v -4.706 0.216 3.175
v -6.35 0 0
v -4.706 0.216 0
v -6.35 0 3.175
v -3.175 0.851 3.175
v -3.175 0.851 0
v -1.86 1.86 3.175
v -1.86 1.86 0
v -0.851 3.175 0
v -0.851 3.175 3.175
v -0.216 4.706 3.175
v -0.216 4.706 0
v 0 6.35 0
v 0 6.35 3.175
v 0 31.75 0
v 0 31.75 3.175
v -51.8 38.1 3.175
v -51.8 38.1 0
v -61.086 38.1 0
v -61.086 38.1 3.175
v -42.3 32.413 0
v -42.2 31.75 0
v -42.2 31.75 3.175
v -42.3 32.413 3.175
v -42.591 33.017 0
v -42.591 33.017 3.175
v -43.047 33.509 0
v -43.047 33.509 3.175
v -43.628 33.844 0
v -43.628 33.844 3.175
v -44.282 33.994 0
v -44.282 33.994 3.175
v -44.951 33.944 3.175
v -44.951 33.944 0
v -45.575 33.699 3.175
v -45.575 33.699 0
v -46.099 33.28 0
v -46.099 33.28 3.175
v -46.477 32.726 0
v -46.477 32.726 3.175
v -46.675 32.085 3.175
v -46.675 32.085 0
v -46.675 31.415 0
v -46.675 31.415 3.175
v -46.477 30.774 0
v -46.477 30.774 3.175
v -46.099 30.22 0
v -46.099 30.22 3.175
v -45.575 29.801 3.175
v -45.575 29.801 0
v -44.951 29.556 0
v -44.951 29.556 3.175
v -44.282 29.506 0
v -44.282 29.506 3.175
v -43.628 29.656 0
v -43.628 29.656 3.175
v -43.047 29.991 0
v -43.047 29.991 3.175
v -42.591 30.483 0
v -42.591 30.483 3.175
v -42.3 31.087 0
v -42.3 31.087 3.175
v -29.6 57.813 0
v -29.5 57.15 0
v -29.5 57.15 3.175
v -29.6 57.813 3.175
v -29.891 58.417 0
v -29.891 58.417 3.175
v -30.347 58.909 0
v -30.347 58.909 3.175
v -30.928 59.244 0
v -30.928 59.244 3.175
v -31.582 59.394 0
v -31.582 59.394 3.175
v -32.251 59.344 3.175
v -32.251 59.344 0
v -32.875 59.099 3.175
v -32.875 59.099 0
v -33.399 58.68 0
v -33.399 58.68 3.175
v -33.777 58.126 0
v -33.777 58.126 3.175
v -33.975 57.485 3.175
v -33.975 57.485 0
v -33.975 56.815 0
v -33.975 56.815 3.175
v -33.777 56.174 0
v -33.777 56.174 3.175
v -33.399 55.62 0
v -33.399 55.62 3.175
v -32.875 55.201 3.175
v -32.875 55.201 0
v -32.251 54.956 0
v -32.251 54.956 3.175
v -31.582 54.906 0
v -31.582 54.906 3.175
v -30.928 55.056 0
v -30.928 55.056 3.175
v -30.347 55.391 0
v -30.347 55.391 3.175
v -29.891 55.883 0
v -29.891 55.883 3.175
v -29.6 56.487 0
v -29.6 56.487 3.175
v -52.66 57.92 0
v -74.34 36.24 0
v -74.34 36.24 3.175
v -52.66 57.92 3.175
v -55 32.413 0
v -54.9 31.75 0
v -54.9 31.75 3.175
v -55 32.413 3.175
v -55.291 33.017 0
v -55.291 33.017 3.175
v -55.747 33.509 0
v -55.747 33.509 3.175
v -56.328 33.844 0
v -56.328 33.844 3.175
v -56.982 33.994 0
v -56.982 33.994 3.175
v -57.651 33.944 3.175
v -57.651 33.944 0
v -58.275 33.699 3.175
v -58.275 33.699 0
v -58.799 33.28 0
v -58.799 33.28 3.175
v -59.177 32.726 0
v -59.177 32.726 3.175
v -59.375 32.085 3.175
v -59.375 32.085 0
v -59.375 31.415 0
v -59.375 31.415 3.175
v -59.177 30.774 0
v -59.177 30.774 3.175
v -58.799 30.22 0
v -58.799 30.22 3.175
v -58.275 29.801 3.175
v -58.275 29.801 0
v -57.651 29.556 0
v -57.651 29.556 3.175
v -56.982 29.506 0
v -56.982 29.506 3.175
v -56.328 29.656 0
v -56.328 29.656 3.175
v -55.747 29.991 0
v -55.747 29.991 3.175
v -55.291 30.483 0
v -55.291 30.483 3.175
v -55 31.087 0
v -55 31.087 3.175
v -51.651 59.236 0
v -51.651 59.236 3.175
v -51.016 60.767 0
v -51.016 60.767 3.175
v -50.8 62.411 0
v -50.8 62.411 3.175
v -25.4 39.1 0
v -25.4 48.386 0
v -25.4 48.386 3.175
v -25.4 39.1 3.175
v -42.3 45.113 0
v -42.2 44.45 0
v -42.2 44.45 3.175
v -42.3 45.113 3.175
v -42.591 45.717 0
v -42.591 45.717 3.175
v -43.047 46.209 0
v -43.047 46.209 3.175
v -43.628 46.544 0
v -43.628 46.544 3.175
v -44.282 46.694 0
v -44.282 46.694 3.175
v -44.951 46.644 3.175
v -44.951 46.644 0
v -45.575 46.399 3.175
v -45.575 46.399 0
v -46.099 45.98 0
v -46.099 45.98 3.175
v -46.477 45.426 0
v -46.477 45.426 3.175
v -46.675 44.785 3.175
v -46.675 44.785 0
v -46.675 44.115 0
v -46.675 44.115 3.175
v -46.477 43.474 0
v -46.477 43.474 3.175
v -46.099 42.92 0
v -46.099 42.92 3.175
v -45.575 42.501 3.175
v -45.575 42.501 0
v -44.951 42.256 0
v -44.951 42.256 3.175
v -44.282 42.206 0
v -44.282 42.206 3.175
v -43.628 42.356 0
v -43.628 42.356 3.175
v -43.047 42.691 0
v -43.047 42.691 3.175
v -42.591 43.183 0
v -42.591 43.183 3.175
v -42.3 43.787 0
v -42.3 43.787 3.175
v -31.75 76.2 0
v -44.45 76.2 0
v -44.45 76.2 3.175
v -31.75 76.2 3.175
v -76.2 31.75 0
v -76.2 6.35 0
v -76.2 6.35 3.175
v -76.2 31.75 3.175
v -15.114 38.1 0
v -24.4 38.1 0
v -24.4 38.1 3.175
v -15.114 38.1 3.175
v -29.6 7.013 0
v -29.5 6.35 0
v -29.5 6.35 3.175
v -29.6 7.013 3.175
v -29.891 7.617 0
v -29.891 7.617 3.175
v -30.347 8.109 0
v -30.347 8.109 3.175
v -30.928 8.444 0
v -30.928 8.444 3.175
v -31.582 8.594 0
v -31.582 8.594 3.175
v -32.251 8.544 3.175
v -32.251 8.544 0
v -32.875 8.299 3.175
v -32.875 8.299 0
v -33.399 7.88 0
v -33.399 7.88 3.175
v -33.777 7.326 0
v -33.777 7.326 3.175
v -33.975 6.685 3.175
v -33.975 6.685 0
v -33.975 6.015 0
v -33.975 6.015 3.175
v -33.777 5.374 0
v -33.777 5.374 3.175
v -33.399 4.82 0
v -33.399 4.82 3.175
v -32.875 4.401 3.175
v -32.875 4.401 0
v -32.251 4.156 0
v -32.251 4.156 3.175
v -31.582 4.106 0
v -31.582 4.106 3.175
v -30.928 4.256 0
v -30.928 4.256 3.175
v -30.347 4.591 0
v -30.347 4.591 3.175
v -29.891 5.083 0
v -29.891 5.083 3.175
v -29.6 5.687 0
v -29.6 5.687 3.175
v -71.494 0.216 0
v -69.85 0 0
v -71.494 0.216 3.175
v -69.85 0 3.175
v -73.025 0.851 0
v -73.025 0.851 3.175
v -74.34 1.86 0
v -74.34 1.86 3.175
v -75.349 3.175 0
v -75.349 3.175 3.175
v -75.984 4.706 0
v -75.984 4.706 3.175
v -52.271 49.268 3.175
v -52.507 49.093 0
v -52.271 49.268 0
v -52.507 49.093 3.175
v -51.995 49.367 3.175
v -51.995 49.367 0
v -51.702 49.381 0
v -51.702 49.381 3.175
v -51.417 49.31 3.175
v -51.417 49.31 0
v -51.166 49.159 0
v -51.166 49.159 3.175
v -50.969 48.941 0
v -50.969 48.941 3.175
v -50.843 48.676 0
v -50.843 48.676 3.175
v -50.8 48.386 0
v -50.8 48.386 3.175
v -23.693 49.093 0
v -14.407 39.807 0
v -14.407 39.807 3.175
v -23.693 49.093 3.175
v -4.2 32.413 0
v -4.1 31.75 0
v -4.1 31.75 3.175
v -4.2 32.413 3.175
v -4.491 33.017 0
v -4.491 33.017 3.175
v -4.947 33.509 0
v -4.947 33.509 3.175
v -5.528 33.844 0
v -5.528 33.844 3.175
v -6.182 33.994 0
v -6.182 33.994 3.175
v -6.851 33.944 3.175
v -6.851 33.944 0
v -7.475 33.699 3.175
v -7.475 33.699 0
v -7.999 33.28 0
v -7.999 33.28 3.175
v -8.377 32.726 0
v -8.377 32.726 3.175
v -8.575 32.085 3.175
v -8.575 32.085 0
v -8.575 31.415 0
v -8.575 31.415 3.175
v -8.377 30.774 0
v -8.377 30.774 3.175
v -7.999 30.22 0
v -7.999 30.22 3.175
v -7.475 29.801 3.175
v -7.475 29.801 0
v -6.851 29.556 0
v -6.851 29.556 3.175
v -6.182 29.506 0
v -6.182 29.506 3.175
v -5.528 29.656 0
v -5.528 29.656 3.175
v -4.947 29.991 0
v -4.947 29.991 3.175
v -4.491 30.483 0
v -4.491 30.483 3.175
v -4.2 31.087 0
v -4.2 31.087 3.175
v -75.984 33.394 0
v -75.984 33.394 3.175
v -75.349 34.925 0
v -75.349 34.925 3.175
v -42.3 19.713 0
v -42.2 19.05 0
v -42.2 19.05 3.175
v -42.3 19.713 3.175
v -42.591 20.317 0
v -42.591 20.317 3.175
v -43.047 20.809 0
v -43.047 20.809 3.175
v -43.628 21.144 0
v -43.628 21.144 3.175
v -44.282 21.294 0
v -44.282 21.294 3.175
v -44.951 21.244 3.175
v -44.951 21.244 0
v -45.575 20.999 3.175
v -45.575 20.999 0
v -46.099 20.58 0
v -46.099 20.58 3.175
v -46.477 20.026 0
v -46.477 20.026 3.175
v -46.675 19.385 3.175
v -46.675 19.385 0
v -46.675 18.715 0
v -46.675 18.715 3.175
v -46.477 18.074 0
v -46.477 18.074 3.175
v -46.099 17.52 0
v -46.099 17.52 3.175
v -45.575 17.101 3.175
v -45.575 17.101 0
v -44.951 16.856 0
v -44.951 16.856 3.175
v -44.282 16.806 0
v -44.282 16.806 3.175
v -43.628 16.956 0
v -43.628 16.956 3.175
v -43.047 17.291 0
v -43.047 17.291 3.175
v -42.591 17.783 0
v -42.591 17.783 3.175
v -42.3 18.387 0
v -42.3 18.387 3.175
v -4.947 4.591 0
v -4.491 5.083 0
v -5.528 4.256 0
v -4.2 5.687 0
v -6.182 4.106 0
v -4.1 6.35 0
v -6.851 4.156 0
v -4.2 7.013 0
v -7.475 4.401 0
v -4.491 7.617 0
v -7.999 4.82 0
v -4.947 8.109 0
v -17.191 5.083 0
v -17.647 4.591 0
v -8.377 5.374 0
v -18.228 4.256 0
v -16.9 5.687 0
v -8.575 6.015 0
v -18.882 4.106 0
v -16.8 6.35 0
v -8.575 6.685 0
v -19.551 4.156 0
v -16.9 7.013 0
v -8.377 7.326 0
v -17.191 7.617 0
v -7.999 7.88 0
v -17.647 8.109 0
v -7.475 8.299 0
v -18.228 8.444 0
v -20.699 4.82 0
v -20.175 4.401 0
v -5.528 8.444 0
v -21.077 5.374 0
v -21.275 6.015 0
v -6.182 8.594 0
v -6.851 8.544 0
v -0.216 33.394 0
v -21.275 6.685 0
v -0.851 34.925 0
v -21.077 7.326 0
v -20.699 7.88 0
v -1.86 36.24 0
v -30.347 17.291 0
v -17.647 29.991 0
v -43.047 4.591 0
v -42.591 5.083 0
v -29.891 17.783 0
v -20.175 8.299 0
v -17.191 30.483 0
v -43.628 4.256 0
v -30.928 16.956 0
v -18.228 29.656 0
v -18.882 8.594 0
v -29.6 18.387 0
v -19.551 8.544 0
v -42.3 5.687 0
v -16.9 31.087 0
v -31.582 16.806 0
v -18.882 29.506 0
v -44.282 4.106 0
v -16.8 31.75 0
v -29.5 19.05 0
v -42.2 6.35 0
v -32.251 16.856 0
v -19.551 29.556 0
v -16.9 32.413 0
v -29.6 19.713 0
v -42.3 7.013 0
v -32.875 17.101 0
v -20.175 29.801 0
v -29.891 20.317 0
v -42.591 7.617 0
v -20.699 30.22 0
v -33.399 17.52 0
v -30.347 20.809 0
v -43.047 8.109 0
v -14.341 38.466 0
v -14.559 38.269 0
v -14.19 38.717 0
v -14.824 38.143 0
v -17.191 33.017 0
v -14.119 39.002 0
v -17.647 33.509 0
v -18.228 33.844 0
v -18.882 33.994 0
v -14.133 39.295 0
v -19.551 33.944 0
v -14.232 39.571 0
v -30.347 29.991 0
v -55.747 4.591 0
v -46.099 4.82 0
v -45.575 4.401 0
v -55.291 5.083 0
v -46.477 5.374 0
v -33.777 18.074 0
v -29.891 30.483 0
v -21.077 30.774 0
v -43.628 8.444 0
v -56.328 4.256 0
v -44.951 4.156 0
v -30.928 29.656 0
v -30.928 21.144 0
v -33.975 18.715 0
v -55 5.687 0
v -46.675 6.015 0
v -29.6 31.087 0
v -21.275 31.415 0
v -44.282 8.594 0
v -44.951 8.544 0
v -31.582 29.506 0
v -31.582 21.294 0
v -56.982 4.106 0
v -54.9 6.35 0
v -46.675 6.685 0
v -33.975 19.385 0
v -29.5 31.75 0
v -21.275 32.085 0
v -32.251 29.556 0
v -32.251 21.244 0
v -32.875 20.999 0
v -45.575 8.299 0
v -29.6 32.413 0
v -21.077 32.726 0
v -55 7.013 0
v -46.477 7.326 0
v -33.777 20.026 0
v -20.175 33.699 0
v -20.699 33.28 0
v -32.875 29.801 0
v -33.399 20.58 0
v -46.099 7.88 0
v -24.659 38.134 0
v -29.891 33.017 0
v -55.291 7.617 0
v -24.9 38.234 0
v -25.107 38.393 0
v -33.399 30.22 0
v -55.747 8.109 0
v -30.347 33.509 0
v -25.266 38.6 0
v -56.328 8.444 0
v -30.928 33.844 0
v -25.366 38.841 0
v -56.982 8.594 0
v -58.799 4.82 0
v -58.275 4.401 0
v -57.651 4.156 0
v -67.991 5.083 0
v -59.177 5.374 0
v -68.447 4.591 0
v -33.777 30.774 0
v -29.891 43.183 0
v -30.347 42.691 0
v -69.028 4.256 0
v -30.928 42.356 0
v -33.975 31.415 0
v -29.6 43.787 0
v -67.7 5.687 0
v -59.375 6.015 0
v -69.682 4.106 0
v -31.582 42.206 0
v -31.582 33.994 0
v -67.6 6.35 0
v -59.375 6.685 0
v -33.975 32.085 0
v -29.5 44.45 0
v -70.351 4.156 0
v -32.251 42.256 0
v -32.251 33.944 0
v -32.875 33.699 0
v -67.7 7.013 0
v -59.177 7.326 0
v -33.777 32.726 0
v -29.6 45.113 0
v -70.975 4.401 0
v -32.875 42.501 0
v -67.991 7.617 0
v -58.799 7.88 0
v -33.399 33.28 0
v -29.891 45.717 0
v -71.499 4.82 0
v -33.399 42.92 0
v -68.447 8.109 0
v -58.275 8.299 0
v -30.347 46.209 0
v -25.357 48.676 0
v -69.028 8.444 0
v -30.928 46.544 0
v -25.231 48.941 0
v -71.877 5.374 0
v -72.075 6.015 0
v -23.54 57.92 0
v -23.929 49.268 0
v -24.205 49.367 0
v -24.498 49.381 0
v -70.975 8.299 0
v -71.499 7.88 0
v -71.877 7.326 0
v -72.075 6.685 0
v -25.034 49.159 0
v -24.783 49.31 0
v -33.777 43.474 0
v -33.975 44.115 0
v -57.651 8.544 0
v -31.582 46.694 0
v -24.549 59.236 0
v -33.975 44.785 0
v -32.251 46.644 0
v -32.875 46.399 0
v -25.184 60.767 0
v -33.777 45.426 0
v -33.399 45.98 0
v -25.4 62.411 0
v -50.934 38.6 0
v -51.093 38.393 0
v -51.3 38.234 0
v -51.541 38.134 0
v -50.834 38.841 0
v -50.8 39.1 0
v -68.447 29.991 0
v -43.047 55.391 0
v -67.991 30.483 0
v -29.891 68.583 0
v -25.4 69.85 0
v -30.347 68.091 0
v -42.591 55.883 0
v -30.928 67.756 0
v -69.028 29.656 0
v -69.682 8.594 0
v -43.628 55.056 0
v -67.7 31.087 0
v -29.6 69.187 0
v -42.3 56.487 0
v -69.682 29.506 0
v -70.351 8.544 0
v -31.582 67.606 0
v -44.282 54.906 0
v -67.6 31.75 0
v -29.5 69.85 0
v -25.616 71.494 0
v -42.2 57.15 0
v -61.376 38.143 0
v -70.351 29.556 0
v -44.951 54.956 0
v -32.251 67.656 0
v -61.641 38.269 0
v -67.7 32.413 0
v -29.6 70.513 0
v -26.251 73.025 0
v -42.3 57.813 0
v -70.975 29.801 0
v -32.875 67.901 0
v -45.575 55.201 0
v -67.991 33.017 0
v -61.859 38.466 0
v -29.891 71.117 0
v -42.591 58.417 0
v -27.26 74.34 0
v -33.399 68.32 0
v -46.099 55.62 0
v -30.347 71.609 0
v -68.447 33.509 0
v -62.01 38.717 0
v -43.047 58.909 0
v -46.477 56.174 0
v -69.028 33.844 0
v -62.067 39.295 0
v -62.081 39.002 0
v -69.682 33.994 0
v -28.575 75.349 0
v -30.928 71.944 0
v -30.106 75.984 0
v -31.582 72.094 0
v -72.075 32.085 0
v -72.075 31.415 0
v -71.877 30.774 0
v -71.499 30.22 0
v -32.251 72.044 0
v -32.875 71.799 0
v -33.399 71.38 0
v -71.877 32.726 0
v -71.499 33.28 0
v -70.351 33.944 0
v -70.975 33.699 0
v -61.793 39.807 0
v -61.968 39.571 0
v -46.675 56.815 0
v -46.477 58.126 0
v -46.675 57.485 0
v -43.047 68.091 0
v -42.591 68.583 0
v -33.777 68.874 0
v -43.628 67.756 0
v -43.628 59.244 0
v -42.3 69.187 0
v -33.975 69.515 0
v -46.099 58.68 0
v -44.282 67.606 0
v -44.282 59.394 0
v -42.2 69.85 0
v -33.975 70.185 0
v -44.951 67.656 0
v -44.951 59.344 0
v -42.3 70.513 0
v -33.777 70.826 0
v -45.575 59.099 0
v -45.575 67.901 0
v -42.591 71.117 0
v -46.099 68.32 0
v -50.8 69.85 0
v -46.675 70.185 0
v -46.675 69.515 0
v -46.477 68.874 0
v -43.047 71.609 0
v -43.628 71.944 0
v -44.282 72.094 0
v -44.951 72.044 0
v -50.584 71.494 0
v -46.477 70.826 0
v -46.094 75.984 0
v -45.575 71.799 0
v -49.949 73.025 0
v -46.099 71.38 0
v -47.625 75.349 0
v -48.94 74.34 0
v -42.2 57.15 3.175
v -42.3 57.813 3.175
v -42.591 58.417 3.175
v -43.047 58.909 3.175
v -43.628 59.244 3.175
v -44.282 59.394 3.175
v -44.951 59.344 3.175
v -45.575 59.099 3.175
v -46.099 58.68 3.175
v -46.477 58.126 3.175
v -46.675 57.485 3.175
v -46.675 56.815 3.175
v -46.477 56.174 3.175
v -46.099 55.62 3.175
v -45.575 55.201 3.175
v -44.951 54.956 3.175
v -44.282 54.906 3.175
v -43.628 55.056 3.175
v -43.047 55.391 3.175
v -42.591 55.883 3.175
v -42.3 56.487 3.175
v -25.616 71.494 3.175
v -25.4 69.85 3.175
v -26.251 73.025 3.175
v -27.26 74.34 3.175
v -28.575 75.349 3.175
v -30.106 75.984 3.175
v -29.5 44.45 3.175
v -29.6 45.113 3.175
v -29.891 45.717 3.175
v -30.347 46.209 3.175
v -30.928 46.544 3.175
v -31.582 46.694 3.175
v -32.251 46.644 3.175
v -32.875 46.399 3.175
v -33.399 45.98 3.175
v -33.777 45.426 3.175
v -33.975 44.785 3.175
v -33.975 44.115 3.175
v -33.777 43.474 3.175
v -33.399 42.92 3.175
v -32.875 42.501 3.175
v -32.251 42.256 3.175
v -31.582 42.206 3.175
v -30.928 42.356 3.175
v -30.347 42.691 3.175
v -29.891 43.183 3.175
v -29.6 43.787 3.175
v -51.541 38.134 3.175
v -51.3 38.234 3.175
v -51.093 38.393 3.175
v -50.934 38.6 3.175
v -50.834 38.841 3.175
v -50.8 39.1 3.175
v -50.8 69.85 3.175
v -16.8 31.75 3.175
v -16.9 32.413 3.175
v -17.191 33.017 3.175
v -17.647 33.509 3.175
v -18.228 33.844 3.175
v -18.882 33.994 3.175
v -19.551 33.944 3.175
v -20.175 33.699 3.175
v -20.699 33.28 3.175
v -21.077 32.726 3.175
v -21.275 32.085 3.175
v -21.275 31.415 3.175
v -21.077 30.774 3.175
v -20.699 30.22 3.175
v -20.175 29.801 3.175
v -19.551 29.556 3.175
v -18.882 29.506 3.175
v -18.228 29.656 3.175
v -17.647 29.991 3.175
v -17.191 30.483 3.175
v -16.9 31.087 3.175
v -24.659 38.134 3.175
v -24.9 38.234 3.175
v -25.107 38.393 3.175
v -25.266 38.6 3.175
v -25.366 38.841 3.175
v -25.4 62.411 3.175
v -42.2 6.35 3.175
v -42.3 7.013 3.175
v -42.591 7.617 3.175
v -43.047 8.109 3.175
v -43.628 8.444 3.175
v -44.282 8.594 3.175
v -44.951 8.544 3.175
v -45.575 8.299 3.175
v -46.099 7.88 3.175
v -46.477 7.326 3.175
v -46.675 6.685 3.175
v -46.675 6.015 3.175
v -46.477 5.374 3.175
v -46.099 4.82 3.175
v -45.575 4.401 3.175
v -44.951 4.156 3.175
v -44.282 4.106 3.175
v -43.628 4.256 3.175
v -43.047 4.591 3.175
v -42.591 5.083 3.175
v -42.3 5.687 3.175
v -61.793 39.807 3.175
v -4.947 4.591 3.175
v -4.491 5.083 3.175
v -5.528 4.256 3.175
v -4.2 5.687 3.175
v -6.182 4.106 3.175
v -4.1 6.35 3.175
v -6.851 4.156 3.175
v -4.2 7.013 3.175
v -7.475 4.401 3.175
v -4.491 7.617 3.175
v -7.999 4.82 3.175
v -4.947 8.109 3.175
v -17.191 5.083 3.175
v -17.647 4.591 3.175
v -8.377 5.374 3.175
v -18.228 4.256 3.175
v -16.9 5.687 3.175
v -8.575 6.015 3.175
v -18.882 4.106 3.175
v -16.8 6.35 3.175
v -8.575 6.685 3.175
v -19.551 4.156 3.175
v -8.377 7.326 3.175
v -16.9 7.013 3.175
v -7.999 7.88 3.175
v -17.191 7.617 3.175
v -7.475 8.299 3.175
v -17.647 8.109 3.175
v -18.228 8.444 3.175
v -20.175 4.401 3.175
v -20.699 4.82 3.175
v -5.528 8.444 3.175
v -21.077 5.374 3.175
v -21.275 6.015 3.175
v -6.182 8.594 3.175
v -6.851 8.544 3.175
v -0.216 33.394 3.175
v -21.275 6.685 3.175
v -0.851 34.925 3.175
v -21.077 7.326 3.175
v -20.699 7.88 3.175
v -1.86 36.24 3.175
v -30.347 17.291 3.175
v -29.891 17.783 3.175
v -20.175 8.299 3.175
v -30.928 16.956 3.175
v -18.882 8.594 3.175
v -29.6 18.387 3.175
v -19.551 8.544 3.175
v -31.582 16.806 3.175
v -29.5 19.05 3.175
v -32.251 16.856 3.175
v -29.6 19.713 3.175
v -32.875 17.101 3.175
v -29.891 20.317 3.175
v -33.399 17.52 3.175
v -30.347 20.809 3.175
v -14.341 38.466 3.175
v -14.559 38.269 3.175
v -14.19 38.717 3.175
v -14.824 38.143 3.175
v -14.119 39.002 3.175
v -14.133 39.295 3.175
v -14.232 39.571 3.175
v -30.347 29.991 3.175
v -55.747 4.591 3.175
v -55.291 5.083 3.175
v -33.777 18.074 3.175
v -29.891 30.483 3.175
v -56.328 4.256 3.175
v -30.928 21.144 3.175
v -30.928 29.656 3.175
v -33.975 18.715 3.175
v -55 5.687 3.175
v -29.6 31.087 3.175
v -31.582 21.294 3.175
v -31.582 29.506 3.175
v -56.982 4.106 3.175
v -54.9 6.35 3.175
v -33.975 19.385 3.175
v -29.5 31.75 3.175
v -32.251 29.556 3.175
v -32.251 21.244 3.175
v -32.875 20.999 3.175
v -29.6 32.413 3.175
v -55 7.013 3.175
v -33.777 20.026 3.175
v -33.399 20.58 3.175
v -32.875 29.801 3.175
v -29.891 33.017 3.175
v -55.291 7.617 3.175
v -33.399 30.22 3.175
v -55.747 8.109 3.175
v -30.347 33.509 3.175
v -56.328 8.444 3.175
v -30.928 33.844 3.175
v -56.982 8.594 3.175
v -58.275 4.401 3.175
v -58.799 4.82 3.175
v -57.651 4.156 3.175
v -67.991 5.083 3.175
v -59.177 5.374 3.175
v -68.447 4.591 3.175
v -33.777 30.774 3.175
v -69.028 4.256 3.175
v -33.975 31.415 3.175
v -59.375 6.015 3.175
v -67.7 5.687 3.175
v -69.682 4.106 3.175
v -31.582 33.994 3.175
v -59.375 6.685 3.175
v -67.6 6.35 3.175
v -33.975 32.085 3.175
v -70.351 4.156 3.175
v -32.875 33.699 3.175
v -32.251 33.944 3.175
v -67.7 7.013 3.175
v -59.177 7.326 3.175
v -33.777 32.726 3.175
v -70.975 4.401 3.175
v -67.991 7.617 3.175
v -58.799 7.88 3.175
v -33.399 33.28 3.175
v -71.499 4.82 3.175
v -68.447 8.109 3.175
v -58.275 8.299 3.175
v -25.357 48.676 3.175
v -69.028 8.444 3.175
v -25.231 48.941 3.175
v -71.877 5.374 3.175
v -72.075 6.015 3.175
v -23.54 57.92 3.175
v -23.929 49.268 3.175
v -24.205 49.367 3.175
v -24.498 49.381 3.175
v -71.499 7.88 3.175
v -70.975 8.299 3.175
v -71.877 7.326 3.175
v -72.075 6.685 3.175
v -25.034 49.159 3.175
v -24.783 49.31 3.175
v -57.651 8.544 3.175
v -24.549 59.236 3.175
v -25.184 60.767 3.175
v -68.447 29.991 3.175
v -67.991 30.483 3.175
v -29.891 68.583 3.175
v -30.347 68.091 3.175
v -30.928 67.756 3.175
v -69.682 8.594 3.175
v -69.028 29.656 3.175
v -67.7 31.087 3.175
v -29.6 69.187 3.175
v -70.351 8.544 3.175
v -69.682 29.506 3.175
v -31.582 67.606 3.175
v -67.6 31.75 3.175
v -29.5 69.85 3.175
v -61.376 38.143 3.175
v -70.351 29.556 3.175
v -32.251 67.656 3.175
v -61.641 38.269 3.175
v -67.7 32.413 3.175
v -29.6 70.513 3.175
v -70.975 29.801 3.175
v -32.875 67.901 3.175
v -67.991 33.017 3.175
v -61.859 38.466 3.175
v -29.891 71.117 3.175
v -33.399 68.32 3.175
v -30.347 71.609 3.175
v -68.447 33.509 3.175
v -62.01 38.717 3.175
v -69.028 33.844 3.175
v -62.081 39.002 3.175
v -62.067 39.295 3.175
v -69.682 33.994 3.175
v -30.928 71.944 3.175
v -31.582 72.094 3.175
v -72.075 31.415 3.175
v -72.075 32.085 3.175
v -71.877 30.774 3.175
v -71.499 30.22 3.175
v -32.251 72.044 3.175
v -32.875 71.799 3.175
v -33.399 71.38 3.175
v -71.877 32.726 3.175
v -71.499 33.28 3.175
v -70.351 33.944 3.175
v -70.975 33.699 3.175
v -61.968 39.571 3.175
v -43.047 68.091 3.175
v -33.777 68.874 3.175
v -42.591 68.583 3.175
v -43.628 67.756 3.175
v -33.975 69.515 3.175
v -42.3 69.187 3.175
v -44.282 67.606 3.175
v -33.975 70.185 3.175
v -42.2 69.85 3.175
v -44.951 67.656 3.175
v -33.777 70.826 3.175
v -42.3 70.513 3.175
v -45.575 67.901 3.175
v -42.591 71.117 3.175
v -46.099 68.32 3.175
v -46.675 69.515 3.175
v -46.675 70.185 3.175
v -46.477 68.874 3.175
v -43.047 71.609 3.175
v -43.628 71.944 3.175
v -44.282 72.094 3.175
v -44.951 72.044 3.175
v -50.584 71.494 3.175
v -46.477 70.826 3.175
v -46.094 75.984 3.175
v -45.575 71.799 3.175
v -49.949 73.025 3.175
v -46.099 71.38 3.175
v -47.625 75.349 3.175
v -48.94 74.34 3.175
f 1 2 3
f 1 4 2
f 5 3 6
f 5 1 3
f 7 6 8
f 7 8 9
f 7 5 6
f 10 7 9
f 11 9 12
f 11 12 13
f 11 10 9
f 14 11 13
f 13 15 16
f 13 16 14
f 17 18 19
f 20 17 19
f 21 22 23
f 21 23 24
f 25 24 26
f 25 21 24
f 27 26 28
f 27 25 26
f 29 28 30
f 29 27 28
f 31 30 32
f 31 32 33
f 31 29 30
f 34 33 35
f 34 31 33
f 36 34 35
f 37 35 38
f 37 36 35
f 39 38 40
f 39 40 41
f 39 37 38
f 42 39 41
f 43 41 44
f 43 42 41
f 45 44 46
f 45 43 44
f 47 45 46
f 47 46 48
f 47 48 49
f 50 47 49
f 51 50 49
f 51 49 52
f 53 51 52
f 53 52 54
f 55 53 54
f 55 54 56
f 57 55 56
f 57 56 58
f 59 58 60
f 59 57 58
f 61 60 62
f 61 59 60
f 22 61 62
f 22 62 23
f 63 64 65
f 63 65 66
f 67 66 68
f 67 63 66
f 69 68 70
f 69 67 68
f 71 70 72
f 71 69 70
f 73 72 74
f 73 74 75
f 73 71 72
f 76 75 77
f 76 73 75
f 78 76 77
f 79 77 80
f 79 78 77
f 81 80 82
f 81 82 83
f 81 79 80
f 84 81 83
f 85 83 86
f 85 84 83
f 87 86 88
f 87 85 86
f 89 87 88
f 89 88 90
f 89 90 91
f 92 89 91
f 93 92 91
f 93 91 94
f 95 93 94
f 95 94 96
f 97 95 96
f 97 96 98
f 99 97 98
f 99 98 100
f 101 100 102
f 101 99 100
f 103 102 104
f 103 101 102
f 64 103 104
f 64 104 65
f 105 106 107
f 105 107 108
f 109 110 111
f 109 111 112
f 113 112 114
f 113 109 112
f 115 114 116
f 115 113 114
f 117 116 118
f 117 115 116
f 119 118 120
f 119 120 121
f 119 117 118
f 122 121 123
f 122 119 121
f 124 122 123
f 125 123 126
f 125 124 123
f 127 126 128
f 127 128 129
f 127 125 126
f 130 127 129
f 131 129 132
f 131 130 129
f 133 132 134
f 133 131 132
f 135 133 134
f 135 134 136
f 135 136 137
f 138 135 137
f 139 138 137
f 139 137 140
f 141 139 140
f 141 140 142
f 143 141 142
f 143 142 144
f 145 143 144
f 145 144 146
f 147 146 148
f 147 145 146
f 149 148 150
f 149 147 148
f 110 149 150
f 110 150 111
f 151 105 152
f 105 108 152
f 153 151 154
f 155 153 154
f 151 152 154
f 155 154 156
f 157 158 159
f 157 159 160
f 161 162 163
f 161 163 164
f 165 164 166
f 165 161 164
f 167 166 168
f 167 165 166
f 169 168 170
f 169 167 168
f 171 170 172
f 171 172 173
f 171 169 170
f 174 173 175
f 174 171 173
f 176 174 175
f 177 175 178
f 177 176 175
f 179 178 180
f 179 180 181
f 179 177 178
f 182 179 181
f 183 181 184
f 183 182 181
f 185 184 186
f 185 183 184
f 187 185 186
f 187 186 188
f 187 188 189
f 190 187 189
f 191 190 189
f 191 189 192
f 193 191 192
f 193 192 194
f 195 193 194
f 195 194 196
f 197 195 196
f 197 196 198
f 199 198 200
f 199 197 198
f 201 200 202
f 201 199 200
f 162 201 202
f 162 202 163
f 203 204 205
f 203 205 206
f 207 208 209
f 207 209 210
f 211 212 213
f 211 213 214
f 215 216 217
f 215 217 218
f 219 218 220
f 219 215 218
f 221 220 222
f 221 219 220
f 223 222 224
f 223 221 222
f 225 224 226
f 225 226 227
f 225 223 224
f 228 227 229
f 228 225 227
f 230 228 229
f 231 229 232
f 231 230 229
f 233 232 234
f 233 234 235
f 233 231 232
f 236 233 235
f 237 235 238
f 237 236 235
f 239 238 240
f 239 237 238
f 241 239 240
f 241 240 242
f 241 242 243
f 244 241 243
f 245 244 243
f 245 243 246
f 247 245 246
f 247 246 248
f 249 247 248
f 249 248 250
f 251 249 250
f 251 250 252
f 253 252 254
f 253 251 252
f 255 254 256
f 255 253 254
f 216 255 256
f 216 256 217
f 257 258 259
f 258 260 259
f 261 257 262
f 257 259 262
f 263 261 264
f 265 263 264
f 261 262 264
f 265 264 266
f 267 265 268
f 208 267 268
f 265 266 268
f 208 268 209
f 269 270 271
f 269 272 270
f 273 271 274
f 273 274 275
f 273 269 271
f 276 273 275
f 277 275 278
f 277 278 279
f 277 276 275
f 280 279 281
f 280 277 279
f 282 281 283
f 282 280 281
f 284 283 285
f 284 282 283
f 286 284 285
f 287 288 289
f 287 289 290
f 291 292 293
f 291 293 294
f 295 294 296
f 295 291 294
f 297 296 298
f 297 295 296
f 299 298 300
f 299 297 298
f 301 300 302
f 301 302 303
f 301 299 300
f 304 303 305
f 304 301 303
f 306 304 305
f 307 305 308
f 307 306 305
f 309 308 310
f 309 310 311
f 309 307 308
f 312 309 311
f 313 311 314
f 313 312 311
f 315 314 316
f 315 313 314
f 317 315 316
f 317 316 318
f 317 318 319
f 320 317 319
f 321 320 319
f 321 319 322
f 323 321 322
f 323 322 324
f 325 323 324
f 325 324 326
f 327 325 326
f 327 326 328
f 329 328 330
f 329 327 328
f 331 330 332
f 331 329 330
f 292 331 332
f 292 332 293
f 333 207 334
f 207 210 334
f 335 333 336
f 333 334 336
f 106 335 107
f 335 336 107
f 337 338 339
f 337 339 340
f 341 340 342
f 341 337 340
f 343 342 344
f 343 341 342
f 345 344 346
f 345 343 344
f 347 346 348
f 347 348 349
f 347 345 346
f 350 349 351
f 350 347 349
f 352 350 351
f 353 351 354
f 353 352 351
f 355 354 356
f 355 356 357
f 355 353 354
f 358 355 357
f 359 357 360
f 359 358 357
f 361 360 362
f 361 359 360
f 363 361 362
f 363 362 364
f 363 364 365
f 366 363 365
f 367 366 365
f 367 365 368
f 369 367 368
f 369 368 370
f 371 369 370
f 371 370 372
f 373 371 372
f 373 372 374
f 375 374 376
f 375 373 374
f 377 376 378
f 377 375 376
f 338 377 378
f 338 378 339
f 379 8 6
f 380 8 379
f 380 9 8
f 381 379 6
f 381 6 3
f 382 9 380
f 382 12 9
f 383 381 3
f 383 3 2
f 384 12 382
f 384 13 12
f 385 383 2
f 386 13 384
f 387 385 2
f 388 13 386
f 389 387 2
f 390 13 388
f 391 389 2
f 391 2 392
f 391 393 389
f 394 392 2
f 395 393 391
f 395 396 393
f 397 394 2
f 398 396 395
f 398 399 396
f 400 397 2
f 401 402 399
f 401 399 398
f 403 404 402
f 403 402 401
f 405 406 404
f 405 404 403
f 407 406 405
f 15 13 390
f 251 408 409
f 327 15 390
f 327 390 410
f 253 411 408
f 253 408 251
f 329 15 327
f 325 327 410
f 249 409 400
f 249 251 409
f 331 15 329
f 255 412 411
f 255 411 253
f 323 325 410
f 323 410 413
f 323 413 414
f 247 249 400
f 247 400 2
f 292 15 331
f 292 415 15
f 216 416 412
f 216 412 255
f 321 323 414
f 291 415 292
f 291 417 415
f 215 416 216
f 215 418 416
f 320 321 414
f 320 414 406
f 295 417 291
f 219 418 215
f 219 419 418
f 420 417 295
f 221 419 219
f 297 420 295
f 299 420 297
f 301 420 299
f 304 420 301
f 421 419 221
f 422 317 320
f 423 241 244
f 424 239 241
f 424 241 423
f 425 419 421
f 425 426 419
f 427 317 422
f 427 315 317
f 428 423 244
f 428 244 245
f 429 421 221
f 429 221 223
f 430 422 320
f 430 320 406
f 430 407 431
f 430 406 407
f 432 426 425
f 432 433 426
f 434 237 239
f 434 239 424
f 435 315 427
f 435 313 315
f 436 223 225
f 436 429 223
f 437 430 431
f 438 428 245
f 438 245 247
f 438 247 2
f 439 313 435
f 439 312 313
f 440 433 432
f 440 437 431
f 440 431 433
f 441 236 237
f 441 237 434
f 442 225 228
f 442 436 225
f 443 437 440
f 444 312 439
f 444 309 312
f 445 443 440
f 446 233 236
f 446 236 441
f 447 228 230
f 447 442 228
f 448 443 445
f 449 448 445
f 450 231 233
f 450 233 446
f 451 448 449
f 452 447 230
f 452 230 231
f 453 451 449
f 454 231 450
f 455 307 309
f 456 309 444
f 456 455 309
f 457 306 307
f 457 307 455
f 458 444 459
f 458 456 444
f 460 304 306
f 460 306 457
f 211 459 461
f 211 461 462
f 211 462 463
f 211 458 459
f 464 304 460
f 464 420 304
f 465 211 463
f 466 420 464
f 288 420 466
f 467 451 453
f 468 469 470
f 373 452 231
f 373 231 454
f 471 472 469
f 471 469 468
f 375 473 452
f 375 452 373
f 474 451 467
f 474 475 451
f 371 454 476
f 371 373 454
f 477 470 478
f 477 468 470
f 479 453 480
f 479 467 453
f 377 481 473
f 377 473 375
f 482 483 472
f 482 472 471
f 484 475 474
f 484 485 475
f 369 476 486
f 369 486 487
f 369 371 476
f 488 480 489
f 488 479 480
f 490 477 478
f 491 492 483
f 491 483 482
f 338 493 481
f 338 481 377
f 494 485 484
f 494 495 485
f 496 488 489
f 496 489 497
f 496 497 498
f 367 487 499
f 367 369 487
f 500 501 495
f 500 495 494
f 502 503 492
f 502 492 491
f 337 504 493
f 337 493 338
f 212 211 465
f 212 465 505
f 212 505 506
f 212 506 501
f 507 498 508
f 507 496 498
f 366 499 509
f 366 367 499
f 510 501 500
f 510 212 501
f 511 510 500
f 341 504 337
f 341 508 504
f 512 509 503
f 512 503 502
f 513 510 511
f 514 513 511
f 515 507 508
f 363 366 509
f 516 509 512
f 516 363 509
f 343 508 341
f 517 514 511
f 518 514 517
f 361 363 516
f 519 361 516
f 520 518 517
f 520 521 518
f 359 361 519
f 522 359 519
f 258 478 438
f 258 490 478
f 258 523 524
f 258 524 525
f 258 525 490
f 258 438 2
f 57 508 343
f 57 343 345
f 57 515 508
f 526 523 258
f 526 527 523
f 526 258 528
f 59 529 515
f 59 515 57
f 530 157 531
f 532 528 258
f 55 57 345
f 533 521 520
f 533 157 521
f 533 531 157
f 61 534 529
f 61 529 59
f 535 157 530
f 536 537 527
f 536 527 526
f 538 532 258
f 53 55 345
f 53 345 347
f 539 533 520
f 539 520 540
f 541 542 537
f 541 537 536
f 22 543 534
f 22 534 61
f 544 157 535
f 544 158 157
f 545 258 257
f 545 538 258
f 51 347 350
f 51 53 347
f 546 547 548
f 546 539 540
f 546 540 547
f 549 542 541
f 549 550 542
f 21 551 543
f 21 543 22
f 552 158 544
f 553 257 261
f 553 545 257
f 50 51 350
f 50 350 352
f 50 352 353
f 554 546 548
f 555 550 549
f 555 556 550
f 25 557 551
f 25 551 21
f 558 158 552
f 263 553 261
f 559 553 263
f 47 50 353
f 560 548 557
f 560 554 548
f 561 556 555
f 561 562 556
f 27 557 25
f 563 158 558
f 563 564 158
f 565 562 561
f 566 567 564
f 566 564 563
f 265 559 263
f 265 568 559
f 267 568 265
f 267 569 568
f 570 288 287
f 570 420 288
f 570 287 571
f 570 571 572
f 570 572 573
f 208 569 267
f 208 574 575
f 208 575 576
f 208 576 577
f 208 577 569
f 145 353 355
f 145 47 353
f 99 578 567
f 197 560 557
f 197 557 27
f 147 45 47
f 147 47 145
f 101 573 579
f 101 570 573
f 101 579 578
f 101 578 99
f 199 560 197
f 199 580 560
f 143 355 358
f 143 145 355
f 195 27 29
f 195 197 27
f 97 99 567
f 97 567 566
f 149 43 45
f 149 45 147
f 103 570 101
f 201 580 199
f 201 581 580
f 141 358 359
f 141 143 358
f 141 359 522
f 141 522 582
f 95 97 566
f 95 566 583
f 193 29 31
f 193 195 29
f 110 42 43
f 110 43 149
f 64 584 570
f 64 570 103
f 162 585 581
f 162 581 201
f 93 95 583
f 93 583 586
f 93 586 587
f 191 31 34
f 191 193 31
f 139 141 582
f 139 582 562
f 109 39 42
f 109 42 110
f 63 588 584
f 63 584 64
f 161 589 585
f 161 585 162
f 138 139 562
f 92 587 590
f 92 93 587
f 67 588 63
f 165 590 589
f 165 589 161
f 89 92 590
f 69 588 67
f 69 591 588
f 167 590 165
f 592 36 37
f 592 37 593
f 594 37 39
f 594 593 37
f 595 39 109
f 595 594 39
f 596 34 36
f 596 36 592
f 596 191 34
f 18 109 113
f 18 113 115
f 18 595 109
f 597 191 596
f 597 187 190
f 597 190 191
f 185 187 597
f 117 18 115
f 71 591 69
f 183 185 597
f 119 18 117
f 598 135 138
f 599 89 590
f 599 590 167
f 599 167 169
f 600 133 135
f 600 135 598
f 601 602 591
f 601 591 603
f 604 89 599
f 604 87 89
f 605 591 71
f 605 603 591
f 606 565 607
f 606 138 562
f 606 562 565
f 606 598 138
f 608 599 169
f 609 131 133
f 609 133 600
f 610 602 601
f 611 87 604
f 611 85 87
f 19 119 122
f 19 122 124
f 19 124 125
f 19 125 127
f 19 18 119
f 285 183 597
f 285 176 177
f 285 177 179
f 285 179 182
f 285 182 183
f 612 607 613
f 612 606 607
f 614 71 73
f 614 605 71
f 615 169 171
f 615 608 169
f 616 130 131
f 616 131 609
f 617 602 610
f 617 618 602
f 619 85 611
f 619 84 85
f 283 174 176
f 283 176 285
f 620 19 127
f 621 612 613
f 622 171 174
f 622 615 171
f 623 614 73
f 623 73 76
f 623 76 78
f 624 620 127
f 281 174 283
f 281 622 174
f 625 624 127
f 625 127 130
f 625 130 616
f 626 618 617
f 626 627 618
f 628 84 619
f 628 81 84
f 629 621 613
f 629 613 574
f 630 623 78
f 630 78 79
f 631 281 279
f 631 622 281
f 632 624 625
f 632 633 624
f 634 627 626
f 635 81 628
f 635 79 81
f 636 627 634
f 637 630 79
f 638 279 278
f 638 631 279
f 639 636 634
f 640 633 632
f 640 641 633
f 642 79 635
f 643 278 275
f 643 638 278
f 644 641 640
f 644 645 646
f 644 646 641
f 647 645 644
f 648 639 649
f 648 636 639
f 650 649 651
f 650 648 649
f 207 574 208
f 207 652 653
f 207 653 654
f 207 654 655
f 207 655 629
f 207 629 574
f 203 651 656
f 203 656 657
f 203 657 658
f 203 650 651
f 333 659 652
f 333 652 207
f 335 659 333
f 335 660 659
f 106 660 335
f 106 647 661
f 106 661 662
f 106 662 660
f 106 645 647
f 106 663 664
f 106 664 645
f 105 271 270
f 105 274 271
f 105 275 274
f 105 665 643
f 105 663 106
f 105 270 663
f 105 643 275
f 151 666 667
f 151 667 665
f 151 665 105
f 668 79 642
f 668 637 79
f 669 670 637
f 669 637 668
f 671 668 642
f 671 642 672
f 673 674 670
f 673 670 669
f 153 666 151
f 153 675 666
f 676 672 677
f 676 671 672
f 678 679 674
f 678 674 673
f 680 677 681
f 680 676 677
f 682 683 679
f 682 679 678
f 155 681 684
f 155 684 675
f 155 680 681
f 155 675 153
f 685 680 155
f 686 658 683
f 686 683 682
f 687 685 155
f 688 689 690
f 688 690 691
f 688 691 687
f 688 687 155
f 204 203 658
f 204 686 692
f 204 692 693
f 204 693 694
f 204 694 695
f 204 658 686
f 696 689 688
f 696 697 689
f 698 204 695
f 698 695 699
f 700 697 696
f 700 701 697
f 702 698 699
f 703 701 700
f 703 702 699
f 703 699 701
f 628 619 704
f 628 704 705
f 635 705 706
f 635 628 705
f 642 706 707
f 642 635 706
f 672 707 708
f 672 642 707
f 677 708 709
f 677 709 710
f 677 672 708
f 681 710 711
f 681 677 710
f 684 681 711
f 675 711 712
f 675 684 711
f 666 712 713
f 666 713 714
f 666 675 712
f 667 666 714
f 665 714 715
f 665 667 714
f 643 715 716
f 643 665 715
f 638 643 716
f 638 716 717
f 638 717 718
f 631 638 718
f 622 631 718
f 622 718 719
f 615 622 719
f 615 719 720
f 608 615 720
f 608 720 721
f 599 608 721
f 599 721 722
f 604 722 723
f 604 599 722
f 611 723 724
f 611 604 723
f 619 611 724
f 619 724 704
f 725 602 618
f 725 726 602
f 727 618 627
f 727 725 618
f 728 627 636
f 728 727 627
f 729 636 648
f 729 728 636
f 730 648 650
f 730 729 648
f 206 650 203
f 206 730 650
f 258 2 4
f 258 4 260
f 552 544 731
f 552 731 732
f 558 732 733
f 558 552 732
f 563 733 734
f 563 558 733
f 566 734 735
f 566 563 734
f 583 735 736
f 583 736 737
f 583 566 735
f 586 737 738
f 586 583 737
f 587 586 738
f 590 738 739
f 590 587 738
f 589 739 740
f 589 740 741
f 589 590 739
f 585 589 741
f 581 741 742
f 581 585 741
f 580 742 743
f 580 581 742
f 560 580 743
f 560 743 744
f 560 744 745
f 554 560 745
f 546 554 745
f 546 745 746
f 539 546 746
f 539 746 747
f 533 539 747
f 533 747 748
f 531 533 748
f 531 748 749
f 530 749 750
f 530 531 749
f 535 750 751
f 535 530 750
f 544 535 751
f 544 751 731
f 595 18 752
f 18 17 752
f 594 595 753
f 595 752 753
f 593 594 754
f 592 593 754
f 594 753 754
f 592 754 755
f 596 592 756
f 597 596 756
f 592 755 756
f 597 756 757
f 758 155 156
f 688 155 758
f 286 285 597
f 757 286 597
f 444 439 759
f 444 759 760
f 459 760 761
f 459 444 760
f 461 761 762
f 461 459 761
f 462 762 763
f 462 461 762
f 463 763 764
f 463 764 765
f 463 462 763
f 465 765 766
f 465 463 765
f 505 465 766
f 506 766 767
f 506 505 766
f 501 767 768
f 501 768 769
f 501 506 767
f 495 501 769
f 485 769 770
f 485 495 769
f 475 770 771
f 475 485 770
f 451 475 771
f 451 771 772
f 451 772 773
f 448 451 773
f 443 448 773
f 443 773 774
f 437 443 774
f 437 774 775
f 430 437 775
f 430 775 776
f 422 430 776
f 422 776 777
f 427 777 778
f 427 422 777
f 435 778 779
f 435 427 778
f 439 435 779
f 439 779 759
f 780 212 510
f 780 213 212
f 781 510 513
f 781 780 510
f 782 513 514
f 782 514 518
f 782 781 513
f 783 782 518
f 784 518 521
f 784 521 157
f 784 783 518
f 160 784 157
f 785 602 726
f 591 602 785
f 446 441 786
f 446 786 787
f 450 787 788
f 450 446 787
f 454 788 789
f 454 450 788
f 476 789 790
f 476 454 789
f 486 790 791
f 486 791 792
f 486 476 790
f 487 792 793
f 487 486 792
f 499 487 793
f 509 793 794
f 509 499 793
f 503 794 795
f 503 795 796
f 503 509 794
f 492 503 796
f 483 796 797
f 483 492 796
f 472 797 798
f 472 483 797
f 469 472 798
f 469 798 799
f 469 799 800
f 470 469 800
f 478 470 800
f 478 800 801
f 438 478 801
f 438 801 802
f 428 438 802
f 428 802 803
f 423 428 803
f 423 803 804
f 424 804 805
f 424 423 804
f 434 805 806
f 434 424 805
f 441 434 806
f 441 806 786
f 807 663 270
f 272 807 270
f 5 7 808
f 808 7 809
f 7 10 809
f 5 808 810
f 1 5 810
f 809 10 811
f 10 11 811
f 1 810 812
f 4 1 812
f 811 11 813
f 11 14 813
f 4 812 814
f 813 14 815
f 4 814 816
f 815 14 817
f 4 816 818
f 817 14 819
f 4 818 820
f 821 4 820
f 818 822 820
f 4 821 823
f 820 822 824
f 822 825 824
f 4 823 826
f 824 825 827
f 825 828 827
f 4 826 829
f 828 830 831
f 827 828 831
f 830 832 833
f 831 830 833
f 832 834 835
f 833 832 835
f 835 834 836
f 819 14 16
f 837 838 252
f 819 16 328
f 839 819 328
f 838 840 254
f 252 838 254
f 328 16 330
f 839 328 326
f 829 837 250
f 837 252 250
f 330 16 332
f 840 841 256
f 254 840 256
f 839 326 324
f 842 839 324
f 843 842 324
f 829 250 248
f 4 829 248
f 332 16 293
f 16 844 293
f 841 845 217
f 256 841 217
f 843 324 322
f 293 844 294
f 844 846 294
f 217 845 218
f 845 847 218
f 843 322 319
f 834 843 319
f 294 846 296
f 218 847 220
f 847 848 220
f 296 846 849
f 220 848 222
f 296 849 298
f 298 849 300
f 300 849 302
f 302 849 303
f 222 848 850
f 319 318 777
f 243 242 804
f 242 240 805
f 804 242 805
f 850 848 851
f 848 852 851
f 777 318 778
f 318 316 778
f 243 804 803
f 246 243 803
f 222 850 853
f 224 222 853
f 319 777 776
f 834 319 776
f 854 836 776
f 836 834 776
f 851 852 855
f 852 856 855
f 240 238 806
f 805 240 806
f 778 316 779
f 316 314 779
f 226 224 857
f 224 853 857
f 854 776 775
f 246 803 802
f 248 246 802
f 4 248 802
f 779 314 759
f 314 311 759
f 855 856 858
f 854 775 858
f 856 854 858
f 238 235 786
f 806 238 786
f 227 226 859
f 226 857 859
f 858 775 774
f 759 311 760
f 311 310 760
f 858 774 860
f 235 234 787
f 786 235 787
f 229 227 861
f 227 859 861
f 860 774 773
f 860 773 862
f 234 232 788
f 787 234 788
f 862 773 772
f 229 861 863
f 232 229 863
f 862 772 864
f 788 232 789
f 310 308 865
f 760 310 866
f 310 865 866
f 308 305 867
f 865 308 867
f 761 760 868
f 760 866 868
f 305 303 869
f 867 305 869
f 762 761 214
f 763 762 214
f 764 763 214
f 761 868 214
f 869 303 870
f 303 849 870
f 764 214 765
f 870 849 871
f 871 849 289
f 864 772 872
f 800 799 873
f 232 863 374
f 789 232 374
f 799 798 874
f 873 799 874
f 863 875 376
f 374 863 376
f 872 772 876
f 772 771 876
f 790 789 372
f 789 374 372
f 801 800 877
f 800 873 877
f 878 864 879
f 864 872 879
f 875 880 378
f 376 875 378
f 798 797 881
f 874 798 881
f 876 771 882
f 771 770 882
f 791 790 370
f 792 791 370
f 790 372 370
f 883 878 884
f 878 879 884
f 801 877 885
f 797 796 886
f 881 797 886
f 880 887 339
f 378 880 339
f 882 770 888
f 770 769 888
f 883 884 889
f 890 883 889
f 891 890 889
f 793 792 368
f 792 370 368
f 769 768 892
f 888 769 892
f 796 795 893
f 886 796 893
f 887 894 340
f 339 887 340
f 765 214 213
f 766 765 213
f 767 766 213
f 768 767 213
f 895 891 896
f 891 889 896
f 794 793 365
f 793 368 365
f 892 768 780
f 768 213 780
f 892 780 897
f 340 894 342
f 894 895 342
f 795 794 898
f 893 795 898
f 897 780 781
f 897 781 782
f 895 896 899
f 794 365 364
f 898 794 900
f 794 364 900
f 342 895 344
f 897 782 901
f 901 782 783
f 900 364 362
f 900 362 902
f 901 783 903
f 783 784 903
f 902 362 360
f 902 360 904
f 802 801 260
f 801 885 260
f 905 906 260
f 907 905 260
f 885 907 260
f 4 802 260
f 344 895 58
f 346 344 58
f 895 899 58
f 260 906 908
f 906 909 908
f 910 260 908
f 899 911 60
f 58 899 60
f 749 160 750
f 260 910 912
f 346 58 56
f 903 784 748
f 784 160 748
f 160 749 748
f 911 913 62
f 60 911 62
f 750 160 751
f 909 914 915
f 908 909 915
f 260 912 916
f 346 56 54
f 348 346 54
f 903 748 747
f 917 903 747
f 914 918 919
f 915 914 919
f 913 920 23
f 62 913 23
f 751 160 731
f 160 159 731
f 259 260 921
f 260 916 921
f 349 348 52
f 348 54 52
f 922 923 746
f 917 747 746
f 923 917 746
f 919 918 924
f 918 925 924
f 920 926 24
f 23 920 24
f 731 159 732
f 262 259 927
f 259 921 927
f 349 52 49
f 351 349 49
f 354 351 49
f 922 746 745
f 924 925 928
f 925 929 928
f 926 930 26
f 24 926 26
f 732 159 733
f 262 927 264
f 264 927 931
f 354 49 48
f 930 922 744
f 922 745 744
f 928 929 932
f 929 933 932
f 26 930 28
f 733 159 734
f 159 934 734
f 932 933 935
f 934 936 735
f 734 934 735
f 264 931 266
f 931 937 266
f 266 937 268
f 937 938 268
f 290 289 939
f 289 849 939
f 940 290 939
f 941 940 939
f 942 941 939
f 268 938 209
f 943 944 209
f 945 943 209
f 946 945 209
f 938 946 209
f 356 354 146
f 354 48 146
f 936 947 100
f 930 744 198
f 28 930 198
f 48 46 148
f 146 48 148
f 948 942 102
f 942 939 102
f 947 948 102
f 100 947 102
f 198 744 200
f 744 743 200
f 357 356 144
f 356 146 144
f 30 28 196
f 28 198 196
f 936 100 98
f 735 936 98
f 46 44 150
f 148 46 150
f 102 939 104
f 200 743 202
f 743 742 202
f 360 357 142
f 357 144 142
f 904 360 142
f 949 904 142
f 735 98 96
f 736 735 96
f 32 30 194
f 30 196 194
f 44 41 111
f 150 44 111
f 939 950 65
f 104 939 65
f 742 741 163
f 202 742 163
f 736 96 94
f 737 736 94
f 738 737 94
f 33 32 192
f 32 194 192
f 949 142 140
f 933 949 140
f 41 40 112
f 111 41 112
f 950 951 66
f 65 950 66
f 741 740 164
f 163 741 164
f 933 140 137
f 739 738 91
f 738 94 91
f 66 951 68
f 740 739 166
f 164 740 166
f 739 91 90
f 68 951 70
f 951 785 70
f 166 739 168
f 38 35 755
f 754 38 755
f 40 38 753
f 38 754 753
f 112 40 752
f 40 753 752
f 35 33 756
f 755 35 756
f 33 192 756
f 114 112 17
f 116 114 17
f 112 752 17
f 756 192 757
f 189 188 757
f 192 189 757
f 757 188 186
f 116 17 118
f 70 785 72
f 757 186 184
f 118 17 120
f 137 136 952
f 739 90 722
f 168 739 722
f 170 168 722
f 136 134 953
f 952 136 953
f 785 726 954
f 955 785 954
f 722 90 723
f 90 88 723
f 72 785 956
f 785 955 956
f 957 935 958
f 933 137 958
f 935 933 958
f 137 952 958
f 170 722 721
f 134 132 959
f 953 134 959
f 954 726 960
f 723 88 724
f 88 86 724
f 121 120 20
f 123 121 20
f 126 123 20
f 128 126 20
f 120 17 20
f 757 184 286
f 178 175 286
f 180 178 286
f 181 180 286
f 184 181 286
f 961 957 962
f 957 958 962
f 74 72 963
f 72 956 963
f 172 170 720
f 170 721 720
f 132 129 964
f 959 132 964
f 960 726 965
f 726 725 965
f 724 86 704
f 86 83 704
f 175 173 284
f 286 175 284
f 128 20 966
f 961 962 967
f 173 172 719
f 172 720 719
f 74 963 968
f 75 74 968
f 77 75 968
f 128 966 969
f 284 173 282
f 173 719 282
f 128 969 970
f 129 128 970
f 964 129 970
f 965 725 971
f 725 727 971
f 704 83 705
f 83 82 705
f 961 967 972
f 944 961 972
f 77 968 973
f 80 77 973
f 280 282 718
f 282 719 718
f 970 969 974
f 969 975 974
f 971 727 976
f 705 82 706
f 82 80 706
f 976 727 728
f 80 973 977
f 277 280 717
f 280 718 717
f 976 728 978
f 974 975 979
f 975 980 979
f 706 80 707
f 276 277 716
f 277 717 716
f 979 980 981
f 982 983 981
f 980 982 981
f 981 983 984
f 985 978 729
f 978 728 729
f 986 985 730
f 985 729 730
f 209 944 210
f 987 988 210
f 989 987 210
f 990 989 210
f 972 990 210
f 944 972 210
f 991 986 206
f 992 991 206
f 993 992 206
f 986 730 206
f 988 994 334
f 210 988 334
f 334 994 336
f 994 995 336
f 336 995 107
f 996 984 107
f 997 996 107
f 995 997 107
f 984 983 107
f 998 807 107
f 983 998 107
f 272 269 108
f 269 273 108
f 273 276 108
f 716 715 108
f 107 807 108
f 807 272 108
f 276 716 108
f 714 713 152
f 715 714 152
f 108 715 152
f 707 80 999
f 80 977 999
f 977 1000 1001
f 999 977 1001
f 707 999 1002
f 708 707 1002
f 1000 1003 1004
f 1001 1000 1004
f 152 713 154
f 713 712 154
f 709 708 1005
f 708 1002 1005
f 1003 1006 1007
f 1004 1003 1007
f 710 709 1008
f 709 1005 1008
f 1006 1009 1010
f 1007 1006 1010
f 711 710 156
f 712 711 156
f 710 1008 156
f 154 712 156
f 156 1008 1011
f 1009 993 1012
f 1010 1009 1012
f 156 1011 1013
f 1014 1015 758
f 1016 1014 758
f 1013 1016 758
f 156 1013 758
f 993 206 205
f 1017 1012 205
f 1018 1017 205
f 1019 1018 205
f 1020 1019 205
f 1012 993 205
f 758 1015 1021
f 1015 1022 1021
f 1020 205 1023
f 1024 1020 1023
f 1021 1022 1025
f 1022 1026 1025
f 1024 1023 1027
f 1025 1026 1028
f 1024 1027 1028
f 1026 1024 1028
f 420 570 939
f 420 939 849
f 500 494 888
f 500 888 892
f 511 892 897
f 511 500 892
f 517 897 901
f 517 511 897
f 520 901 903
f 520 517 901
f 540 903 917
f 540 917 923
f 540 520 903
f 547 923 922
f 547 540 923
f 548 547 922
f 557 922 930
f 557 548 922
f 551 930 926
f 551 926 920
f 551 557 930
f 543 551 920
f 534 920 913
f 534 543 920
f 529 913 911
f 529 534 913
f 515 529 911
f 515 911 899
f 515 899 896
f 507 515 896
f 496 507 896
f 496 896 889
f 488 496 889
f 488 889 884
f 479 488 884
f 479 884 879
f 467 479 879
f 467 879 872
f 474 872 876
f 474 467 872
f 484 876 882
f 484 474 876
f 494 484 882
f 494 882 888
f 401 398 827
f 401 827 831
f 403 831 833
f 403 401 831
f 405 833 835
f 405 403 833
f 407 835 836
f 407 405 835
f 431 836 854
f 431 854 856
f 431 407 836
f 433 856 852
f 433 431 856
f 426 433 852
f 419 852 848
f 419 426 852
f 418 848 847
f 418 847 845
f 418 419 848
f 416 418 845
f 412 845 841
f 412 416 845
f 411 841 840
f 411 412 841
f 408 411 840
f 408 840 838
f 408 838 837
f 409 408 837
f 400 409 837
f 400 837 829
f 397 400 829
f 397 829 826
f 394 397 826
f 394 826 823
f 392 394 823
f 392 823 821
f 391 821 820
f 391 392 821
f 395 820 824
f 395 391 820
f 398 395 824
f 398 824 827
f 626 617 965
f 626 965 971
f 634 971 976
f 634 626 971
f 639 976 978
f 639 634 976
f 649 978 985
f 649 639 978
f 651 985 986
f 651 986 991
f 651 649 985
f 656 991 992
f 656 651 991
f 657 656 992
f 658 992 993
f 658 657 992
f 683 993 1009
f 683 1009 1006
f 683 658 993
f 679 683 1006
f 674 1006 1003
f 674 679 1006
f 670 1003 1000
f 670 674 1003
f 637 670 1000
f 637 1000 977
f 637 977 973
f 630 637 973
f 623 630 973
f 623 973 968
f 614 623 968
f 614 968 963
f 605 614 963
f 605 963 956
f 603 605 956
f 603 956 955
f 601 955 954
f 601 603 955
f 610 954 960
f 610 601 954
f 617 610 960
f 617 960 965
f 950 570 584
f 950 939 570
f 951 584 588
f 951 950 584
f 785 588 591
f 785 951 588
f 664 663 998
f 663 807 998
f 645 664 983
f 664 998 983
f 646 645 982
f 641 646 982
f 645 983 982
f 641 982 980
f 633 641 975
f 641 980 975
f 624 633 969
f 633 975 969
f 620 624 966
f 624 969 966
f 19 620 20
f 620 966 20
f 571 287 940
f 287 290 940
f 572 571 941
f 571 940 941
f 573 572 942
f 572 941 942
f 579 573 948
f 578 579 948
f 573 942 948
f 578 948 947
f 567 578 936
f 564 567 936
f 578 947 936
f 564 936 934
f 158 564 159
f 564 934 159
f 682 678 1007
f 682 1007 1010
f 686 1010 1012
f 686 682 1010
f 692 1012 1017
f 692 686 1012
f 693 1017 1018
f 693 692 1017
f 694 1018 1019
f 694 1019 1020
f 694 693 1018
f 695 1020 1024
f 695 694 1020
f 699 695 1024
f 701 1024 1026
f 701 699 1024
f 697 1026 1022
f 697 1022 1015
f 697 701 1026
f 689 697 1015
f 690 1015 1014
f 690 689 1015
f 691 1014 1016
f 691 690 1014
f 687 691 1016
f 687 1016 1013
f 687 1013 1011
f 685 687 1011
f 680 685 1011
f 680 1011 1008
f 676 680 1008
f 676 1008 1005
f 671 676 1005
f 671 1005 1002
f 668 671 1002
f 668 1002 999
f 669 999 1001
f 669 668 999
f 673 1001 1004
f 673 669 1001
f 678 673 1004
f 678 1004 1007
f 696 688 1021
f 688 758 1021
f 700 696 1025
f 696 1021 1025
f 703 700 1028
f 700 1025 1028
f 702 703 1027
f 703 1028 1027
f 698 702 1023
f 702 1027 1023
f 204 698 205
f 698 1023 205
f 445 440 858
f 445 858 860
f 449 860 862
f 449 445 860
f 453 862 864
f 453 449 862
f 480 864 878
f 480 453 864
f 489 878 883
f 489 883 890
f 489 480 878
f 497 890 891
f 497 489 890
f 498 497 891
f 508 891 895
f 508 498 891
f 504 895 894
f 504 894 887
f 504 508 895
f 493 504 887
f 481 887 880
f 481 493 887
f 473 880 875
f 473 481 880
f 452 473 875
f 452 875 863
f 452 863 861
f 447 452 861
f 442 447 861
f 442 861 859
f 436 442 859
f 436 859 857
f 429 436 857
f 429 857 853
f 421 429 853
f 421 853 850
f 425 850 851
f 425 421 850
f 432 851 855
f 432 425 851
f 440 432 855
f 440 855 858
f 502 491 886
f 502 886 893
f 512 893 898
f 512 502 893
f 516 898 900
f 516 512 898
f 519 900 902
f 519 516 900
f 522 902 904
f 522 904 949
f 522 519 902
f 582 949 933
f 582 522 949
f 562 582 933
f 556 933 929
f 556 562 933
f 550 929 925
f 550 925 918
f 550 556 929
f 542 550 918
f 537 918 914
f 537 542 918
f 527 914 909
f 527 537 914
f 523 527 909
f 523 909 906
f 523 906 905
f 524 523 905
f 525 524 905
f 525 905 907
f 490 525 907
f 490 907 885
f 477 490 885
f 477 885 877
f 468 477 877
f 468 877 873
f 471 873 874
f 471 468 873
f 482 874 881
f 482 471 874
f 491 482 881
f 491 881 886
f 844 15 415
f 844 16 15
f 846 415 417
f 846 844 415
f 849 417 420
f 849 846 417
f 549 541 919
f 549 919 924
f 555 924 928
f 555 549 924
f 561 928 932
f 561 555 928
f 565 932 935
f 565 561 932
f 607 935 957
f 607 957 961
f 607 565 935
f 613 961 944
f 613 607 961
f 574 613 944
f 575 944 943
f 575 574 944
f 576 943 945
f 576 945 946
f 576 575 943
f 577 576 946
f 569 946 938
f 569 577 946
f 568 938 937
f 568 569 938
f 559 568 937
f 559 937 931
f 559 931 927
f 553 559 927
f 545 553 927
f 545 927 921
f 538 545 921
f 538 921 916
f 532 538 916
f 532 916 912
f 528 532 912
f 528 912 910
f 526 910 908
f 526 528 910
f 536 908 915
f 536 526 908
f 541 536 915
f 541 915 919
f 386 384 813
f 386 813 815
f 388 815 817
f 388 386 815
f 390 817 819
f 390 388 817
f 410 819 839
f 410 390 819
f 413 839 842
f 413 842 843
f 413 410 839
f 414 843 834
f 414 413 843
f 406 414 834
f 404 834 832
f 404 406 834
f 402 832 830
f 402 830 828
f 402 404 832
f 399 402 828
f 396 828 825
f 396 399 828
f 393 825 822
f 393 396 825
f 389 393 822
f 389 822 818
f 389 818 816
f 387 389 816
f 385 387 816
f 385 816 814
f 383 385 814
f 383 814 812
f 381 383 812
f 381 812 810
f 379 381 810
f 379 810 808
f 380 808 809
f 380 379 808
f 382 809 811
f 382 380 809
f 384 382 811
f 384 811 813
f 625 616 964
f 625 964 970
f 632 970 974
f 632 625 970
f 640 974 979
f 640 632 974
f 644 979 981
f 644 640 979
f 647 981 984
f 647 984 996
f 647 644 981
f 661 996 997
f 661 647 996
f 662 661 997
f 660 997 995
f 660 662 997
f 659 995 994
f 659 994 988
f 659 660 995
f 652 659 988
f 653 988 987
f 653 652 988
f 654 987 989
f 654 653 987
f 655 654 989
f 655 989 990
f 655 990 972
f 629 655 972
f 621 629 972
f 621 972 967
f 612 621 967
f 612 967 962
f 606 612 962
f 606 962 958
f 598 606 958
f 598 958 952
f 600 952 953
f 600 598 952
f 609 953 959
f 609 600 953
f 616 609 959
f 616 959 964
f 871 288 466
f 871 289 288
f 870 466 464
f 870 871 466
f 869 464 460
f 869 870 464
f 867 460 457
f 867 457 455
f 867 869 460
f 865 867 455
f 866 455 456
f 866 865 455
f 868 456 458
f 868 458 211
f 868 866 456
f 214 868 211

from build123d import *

# Parameters (mm, degrees)
SKETCH1_R           = 2.25
BOSS_EXTRUDE1_DEPTH = 3.175
FILLET1_R           = 6.35
FILLET2_R           = 1


with BuildPart() as part:
    # Sketch1 → Boss-Extrude1 (new body)
    with BuildSketch(Plane.XY):
        Polygon((0, 0), (-76.2, 0), (-76.2, 34.380256121), (-50.8, 59.780256121), (-50.8, 76.2), (-25.4, 76.2), (-25.4, 59.780256121), (0, 34.380256121), align=None)
        with Locations((-44.45, 57.15)):
            Circle(SKETCH1_R, mode=Mode.SUBTRACT)
        with Locations((-69.85, 6.35)):
            Circle(SKETCH1_R, mode=Mode.SUBTRACT)
        with Locations((-6.35, 6.35)):
            Circle(SKETCH1_R, mode=Mode.SUBTRACT)
        with Locations((-31.75, 44.45)):
            Circle(SKETCH1_R, mode=Mode.SUBTRACT)
        with Locations((-44.45, 44.45)):
            Circle(SKETCH1_R, mode=Mode.SUBTRACT)
        with Locations((-57.15, 6.35)):
            Circle(SKETCH1_R, mode=Mode.SUBTRACT)
        with Locations((-57.15, 31.75)):
            Circle(SKETCH1_R, mode=Mode.SUBTRACT)
        with Locations((-69.85, 31.75)):
            Circle(SKETCH1_R, mode=Mode.SUBTRACT)
        with Locations((-19.05, 6.35)):
            Circle(SKETCH1_R, mode=Mode.SUBTRACT)
        with Locations((-19.05, 31.75)):
            Circle(SKETCH1_R, mode=Mode.SUBTRACT)
        with Locations((-6.35, 31.75)):
            Circle(SKETCH1_R, mode=Mode.SUBTRACT)
        with Locations((-44.45, 31.75)):
            Circle(SKETCH1_R, mode=Mode.SUBTRACT)
        with Locations((-31.75, 31.75)):
            Circle(SKETCH1_R, mode=Mode.SUBTRACT)
        with Locations((-44.45, 19.05)):
            Circle(SKETCH1_R, mode=Mode.SUBTRACT)
        with Locations((-31.75, 19.05)):
            Circle(SKETCH1_R, mode=Mode.SUBTRACT)
        with Locations((-44.45, 6.35)):
            Circle(SKETCH1_R, mode=Mode.SUBTRACT)
        with Locations((-31.75, 6.35)):
            Circle(SKETCH1_R, mode=Mode.SUBTRACT)
        with Locations((-31.75, 57.15)):
            Circle(SKETCH1_R, mode=Mode.SUBTRACT)
        with Locations((-31.75, 69.85)):
            Circle(SKETCH1_R, mode=Mode.SUBTRACT)
        with Locations((-44.45, 69.85)):
            Circle(SKETCH1_R, mode=Mode.SUBTRACT)
        Polygon((-63.5, 38.1), (-50.8, 50.8), (-50.8, 38.1), align=None, mode=Mode.SUBTRACT)
        Polygon((-25.4, 50.8), (-25.4, 38.1), (-12.7, 38.1), align=None, mode=Mode.SUBTRACT)
    extrude(amount=BOSS_EXTRUDE1_DEPTH)

    # Fillet1
    fillet1_edges = [part.edges().sort_by_distance(p)[0] for p in [
        (0, 0, 1.5875),
        (-76.2, 0, 1.5875),
        (-76.2, 34.380256121, 1.5875),
        (-50.8, 59.780256121, 1.5875),
        (-50.8, 76.2, 1.5875),
        (-25.4, 76.2, 1.5875),
        (-25.4, 59.780256121, 1.5875),
        (0, 34.380256121, 1.5875),
    ]]
    fillet(fillet1_edges, radius=FILLET1_R)

    # Fillet2
    fillet2_edges = [part.edges().sort_by_distance(p)[0] for p in [
        (-63.5, 38.1, 1.5875),
        (-50.8, 38.1, 1.5875),
        (-50.8, 50.8, 1.5875),
        (-12.7, 38.1, 1.5875),
        (-25.4, 50.8, 1.5875),
        (-25.4, 38.1, 1.5875),
    ]]
    fillet(fillet2_edges, radius=FILLET2_R)


solid = part.part
